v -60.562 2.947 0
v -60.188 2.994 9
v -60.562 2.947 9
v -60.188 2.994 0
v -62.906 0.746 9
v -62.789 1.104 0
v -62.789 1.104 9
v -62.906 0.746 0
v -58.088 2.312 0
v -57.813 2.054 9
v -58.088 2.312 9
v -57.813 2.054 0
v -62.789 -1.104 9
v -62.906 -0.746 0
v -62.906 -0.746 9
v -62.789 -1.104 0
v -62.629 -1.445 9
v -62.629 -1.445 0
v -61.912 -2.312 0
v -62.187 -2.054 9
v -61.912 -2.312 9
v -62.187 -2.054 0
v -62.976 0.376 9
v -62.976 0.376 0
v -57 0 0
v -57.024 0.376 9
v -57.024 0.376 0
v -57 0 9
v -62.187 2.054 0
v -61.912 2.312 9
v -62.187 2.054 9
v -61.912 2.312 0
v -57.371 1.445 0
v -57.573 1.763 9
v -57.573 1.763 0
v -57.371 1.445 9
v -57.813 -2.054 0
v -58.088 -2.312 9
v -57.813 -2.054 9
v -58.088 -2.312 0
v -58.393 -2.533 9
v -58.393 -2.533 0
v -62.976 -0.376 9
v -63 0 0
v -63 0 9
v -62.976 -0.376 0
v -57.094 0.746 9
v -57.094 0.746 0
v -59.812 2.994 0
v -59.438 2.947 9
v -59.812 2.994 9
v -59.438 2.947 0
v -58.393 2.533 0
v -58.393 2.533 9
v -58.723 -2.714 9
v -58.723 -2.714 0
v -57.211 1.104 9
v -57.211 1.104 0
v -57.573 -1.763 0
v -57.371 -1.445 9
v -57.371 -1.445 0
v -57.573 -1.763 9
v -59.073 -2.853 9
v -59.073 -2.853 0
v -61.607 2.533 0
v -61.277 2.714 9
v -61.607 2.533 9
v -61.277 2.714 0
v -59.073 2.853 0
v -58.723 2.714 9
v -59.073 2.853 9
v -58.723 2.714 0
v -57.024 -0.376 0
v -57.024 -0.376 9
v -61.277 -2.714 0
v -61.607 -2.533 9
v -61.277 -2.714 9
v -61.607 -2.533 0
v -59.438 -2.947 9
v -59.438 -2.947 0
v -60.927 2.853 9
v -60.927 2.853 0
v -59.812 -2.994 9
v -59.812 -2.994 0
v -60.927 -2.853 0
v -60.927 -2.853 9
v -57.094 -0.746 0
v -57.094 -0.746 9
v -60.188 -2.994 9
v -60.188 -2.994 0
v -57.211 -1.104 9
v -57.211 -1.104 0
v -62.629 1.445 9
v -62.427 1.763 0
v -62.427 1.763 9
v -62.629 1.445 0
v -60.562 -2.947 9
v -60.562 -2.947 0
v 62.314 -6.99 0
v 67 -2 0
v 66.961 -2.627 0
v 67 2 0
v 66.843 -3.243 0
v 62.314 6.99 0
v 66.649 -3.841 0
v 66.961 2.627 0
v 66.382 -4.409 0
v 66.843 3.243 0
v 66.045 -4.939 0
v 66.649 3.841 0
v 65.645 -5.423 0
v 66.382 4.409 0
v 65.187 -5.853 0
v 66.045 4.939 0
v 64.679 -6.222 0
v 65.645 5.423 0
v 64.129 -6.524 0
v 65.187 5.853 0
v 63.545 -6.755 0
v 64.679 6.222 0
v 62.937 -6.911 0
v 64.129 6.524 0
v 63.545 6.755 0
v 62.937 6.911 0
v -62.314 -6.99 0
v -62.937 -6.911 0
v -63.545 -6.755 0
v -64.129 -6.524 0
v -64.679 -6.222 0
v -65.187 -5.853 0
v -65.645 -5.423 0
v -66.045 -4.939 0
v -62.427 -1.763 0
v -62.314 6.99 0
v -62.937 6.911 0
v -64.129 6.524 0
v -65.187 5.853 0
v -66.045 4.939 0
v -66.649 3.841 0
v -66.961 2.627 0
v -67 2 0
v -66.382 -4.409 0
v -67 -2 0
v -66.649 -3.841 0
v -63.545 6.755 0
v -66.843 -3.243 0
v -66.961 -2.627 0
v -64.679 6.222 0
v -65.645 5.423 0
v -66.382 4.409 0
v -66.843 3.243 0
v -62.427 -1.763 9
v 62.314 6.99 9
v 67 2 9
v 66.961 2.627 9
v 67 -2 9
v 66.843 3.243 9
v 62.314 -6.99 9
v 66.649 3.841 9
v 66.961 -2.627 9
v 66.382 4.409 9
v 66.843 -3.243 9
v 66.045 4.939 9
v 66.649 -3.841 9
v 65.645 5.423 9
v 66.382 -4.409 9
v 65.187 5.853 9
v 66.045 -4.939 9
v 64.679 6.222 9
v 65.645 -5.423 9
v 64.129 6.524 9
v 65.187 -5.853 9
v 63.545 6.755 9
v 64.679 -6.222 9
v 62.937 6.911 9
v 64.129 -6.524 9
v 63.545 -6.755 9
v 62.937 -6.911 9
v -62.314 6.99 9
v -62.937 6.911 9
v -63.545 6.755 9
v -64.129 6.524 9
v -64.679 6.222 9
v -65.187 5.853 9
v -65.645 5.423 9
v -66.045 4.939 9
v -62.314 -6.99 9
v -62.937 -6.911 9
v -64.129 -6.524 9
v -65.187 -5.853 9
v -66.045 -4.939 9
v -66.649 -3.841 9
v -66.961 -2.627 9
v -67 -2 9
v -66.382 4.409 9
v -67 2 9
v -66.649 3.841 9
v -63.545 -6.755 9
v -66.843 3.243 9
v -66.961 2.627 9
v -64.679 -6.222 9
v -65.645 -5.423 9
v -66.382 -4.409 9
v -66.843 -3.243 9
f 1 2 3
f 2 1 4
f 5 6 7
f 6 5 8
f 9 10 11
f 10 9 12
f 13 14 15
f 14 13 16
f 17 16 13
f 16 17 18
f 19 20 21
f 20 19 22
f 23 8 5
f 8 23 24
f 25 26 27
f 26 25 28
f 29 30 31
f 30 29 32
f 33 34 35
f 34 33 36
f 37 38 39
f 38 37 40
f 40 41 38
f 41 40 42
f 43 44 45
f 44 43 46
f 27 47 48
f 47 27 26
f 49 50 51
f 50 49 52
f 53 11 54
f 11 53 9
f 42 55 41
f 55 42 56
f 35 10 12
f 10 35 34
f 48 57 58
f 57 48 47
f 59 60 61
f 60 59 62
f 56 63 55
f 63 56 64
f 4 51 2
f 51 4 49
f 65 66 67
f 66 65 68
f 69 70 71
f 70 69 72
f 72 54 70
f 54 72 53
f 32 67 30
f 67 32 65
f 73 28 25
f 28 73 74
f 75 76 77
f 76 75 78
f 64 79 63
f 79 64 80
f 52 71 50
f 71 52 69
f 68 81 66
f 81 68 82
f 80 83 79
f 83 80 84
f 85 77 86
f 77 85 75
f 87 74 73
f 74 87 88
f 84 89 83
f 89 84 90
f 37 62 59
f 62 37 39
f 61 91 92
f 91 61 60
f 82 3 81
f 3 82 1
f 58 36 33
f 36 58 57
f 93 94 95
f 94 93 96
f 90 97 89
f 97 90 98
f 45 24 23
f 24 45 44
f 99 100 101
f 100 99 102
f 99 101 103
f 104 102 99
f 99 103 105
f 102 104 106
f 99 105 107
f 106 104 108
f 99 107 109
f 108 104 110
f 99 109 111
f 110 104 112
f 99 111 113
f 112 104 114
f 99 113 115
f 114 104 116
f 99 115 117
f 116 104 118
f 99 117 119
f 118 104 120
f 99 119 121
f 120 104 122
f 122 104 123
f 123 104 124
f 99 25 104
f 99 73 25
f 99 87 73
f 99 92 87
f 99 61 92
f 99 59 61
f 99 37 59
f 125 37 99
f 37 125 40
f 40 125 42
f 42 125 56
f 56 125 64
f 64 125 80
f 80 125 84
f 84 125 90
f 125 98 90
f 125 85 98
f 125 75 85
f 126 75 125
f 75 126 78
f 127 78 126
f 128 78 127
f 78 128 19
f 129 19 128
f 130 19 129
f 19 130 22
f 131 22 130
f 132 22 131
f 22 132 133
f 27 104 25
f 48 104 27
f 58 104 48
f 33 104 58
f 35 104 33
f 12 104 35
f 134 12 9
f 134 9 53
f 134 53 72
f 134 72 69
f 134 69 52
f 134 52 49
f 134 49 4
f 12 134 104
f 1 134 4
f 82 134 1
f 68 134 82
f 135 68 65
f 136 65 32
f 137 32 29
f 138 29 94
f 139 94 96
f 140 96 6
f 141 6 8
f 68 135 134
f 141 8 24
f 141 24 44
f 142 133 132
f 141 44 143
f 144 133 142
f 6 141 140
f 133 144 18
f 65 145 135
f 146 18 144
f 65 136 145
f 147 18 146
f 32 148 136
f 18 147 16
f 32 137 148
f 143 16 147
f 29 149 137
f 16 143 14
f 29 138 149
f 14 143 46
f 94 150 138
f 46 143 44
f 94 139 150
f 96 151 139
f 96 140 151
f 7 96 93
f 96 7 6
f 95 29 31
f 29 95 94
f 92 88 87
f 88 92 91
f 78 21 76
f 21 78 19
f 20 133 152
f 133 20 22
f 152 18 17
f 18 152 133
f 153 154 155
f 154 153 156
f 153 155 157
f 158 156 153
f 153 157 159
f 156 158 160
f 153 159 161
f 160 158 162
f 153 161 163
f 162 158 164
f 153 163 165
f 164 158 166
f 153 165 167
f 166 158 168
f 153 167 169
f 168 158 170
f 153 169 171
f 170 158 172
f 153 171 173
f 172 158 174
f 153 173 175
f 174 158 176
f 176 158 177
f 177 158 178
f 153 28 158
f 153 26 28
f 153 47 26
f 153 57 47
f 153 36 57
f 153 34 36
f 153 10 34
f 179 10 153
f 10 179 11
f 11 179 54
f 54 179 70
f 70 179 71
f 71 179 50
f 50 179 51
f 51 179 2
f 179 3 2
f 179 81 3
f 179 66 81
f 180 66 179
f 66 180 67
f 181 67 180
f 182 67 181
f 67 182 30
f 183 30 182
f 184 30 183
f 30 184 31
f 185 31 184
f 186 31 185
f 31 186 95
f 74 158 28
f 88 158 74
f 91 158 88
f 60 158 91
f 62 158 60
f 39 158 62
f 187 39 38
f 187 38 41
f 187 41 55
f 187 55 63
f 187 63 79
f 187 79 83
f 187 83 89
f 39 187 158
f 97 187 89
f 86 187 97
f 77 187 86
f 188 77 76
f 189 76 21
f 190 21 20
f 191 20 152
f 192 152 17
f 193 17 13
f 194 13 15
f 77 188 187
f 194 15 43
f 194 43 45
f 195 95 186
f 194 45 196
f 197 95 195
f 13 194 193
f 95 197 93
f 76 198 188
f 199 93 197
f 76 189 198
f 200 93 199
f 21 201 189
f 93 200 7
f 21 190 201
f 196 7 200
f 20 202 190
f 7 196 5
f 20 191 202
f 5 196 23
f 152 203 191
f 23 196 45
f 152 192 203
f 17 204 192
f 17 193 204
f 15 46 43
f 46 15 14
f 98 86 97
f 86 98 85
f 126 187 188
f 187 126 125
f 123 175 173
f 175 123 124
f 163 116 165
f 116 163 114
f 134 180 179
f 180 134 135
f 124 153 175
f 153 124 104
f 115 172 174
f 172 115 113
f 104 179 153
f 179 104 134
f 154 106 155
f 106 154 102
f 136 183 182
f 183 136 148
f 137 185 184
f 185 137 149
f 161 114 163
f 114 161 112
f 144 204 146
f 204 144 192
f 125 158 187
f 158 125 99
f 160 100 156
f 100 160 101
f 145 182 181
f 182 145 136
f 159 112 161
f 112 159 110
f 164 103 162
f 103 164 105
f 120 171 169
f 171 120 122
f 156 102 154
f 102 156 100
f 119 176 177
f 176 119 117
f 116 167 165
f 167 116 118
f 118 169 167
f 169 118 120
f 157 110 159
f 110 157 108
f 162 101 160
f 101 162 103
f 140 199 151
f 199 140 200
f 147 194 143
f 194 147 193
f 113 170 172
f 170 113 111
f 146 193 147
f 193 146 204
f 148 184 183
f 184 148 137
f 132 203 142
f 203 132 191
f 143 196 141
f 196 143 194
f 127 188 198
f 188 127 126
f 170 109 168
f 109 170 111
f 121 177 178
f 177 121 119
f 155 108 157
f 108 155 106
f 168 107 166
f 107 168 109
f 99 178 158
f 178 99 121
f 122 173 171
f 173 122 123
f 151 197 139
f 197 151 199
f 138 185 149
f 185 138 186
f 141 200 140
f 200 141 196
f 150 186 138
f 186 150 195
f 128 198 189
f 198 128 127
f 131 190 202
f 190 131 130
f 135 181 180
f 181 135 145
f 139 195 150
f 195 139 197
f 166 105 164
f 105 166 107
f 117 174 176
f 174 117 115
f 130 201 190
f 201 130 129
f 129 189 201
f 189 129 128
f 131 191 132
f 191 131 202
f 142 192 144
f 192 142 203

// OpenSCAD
$fn = 50;


difference() {
	union() {
		hull() {
			translate(v = [-62.0000000000, 2.0000000000, 0]) {
				cylinder(h = 9, r = 5);
			}
			translate(v = [62.0000000000, 2.0000000000, 0]) {
				cylinder(h = 9, r = 5);
			}
			translate(v = [-62.0000000000, -2.0000000000, 0]) {
				cylinder(h = 9, r = 5);
			}
			translate(v = [62.0000000000, -2.0000000000, 0]) {
				cylinder(h = 9, r = 5);
			}
		}
	}
	union() {
		translate(v = [-60.0000000000, 0.0000000000, 0]) {
			cylinder(h = 9, r = 3.0000000000);
		}
		translate(v = [-60.0000000000, 0.0000000000, 0]) {
			cylinder(h = 9, r = 1.5000000000);
		}
		translate(v = [-60.0000000000, 0.0000000000, 0]) {
			cylinder(h = 9, r = 1.5000000000);
		}
		translate(v = [-60.0000000000, 0.0000000000, 0]) {
			cylinder(h = 9, r = 1.5000000000);
		}
	}
}
